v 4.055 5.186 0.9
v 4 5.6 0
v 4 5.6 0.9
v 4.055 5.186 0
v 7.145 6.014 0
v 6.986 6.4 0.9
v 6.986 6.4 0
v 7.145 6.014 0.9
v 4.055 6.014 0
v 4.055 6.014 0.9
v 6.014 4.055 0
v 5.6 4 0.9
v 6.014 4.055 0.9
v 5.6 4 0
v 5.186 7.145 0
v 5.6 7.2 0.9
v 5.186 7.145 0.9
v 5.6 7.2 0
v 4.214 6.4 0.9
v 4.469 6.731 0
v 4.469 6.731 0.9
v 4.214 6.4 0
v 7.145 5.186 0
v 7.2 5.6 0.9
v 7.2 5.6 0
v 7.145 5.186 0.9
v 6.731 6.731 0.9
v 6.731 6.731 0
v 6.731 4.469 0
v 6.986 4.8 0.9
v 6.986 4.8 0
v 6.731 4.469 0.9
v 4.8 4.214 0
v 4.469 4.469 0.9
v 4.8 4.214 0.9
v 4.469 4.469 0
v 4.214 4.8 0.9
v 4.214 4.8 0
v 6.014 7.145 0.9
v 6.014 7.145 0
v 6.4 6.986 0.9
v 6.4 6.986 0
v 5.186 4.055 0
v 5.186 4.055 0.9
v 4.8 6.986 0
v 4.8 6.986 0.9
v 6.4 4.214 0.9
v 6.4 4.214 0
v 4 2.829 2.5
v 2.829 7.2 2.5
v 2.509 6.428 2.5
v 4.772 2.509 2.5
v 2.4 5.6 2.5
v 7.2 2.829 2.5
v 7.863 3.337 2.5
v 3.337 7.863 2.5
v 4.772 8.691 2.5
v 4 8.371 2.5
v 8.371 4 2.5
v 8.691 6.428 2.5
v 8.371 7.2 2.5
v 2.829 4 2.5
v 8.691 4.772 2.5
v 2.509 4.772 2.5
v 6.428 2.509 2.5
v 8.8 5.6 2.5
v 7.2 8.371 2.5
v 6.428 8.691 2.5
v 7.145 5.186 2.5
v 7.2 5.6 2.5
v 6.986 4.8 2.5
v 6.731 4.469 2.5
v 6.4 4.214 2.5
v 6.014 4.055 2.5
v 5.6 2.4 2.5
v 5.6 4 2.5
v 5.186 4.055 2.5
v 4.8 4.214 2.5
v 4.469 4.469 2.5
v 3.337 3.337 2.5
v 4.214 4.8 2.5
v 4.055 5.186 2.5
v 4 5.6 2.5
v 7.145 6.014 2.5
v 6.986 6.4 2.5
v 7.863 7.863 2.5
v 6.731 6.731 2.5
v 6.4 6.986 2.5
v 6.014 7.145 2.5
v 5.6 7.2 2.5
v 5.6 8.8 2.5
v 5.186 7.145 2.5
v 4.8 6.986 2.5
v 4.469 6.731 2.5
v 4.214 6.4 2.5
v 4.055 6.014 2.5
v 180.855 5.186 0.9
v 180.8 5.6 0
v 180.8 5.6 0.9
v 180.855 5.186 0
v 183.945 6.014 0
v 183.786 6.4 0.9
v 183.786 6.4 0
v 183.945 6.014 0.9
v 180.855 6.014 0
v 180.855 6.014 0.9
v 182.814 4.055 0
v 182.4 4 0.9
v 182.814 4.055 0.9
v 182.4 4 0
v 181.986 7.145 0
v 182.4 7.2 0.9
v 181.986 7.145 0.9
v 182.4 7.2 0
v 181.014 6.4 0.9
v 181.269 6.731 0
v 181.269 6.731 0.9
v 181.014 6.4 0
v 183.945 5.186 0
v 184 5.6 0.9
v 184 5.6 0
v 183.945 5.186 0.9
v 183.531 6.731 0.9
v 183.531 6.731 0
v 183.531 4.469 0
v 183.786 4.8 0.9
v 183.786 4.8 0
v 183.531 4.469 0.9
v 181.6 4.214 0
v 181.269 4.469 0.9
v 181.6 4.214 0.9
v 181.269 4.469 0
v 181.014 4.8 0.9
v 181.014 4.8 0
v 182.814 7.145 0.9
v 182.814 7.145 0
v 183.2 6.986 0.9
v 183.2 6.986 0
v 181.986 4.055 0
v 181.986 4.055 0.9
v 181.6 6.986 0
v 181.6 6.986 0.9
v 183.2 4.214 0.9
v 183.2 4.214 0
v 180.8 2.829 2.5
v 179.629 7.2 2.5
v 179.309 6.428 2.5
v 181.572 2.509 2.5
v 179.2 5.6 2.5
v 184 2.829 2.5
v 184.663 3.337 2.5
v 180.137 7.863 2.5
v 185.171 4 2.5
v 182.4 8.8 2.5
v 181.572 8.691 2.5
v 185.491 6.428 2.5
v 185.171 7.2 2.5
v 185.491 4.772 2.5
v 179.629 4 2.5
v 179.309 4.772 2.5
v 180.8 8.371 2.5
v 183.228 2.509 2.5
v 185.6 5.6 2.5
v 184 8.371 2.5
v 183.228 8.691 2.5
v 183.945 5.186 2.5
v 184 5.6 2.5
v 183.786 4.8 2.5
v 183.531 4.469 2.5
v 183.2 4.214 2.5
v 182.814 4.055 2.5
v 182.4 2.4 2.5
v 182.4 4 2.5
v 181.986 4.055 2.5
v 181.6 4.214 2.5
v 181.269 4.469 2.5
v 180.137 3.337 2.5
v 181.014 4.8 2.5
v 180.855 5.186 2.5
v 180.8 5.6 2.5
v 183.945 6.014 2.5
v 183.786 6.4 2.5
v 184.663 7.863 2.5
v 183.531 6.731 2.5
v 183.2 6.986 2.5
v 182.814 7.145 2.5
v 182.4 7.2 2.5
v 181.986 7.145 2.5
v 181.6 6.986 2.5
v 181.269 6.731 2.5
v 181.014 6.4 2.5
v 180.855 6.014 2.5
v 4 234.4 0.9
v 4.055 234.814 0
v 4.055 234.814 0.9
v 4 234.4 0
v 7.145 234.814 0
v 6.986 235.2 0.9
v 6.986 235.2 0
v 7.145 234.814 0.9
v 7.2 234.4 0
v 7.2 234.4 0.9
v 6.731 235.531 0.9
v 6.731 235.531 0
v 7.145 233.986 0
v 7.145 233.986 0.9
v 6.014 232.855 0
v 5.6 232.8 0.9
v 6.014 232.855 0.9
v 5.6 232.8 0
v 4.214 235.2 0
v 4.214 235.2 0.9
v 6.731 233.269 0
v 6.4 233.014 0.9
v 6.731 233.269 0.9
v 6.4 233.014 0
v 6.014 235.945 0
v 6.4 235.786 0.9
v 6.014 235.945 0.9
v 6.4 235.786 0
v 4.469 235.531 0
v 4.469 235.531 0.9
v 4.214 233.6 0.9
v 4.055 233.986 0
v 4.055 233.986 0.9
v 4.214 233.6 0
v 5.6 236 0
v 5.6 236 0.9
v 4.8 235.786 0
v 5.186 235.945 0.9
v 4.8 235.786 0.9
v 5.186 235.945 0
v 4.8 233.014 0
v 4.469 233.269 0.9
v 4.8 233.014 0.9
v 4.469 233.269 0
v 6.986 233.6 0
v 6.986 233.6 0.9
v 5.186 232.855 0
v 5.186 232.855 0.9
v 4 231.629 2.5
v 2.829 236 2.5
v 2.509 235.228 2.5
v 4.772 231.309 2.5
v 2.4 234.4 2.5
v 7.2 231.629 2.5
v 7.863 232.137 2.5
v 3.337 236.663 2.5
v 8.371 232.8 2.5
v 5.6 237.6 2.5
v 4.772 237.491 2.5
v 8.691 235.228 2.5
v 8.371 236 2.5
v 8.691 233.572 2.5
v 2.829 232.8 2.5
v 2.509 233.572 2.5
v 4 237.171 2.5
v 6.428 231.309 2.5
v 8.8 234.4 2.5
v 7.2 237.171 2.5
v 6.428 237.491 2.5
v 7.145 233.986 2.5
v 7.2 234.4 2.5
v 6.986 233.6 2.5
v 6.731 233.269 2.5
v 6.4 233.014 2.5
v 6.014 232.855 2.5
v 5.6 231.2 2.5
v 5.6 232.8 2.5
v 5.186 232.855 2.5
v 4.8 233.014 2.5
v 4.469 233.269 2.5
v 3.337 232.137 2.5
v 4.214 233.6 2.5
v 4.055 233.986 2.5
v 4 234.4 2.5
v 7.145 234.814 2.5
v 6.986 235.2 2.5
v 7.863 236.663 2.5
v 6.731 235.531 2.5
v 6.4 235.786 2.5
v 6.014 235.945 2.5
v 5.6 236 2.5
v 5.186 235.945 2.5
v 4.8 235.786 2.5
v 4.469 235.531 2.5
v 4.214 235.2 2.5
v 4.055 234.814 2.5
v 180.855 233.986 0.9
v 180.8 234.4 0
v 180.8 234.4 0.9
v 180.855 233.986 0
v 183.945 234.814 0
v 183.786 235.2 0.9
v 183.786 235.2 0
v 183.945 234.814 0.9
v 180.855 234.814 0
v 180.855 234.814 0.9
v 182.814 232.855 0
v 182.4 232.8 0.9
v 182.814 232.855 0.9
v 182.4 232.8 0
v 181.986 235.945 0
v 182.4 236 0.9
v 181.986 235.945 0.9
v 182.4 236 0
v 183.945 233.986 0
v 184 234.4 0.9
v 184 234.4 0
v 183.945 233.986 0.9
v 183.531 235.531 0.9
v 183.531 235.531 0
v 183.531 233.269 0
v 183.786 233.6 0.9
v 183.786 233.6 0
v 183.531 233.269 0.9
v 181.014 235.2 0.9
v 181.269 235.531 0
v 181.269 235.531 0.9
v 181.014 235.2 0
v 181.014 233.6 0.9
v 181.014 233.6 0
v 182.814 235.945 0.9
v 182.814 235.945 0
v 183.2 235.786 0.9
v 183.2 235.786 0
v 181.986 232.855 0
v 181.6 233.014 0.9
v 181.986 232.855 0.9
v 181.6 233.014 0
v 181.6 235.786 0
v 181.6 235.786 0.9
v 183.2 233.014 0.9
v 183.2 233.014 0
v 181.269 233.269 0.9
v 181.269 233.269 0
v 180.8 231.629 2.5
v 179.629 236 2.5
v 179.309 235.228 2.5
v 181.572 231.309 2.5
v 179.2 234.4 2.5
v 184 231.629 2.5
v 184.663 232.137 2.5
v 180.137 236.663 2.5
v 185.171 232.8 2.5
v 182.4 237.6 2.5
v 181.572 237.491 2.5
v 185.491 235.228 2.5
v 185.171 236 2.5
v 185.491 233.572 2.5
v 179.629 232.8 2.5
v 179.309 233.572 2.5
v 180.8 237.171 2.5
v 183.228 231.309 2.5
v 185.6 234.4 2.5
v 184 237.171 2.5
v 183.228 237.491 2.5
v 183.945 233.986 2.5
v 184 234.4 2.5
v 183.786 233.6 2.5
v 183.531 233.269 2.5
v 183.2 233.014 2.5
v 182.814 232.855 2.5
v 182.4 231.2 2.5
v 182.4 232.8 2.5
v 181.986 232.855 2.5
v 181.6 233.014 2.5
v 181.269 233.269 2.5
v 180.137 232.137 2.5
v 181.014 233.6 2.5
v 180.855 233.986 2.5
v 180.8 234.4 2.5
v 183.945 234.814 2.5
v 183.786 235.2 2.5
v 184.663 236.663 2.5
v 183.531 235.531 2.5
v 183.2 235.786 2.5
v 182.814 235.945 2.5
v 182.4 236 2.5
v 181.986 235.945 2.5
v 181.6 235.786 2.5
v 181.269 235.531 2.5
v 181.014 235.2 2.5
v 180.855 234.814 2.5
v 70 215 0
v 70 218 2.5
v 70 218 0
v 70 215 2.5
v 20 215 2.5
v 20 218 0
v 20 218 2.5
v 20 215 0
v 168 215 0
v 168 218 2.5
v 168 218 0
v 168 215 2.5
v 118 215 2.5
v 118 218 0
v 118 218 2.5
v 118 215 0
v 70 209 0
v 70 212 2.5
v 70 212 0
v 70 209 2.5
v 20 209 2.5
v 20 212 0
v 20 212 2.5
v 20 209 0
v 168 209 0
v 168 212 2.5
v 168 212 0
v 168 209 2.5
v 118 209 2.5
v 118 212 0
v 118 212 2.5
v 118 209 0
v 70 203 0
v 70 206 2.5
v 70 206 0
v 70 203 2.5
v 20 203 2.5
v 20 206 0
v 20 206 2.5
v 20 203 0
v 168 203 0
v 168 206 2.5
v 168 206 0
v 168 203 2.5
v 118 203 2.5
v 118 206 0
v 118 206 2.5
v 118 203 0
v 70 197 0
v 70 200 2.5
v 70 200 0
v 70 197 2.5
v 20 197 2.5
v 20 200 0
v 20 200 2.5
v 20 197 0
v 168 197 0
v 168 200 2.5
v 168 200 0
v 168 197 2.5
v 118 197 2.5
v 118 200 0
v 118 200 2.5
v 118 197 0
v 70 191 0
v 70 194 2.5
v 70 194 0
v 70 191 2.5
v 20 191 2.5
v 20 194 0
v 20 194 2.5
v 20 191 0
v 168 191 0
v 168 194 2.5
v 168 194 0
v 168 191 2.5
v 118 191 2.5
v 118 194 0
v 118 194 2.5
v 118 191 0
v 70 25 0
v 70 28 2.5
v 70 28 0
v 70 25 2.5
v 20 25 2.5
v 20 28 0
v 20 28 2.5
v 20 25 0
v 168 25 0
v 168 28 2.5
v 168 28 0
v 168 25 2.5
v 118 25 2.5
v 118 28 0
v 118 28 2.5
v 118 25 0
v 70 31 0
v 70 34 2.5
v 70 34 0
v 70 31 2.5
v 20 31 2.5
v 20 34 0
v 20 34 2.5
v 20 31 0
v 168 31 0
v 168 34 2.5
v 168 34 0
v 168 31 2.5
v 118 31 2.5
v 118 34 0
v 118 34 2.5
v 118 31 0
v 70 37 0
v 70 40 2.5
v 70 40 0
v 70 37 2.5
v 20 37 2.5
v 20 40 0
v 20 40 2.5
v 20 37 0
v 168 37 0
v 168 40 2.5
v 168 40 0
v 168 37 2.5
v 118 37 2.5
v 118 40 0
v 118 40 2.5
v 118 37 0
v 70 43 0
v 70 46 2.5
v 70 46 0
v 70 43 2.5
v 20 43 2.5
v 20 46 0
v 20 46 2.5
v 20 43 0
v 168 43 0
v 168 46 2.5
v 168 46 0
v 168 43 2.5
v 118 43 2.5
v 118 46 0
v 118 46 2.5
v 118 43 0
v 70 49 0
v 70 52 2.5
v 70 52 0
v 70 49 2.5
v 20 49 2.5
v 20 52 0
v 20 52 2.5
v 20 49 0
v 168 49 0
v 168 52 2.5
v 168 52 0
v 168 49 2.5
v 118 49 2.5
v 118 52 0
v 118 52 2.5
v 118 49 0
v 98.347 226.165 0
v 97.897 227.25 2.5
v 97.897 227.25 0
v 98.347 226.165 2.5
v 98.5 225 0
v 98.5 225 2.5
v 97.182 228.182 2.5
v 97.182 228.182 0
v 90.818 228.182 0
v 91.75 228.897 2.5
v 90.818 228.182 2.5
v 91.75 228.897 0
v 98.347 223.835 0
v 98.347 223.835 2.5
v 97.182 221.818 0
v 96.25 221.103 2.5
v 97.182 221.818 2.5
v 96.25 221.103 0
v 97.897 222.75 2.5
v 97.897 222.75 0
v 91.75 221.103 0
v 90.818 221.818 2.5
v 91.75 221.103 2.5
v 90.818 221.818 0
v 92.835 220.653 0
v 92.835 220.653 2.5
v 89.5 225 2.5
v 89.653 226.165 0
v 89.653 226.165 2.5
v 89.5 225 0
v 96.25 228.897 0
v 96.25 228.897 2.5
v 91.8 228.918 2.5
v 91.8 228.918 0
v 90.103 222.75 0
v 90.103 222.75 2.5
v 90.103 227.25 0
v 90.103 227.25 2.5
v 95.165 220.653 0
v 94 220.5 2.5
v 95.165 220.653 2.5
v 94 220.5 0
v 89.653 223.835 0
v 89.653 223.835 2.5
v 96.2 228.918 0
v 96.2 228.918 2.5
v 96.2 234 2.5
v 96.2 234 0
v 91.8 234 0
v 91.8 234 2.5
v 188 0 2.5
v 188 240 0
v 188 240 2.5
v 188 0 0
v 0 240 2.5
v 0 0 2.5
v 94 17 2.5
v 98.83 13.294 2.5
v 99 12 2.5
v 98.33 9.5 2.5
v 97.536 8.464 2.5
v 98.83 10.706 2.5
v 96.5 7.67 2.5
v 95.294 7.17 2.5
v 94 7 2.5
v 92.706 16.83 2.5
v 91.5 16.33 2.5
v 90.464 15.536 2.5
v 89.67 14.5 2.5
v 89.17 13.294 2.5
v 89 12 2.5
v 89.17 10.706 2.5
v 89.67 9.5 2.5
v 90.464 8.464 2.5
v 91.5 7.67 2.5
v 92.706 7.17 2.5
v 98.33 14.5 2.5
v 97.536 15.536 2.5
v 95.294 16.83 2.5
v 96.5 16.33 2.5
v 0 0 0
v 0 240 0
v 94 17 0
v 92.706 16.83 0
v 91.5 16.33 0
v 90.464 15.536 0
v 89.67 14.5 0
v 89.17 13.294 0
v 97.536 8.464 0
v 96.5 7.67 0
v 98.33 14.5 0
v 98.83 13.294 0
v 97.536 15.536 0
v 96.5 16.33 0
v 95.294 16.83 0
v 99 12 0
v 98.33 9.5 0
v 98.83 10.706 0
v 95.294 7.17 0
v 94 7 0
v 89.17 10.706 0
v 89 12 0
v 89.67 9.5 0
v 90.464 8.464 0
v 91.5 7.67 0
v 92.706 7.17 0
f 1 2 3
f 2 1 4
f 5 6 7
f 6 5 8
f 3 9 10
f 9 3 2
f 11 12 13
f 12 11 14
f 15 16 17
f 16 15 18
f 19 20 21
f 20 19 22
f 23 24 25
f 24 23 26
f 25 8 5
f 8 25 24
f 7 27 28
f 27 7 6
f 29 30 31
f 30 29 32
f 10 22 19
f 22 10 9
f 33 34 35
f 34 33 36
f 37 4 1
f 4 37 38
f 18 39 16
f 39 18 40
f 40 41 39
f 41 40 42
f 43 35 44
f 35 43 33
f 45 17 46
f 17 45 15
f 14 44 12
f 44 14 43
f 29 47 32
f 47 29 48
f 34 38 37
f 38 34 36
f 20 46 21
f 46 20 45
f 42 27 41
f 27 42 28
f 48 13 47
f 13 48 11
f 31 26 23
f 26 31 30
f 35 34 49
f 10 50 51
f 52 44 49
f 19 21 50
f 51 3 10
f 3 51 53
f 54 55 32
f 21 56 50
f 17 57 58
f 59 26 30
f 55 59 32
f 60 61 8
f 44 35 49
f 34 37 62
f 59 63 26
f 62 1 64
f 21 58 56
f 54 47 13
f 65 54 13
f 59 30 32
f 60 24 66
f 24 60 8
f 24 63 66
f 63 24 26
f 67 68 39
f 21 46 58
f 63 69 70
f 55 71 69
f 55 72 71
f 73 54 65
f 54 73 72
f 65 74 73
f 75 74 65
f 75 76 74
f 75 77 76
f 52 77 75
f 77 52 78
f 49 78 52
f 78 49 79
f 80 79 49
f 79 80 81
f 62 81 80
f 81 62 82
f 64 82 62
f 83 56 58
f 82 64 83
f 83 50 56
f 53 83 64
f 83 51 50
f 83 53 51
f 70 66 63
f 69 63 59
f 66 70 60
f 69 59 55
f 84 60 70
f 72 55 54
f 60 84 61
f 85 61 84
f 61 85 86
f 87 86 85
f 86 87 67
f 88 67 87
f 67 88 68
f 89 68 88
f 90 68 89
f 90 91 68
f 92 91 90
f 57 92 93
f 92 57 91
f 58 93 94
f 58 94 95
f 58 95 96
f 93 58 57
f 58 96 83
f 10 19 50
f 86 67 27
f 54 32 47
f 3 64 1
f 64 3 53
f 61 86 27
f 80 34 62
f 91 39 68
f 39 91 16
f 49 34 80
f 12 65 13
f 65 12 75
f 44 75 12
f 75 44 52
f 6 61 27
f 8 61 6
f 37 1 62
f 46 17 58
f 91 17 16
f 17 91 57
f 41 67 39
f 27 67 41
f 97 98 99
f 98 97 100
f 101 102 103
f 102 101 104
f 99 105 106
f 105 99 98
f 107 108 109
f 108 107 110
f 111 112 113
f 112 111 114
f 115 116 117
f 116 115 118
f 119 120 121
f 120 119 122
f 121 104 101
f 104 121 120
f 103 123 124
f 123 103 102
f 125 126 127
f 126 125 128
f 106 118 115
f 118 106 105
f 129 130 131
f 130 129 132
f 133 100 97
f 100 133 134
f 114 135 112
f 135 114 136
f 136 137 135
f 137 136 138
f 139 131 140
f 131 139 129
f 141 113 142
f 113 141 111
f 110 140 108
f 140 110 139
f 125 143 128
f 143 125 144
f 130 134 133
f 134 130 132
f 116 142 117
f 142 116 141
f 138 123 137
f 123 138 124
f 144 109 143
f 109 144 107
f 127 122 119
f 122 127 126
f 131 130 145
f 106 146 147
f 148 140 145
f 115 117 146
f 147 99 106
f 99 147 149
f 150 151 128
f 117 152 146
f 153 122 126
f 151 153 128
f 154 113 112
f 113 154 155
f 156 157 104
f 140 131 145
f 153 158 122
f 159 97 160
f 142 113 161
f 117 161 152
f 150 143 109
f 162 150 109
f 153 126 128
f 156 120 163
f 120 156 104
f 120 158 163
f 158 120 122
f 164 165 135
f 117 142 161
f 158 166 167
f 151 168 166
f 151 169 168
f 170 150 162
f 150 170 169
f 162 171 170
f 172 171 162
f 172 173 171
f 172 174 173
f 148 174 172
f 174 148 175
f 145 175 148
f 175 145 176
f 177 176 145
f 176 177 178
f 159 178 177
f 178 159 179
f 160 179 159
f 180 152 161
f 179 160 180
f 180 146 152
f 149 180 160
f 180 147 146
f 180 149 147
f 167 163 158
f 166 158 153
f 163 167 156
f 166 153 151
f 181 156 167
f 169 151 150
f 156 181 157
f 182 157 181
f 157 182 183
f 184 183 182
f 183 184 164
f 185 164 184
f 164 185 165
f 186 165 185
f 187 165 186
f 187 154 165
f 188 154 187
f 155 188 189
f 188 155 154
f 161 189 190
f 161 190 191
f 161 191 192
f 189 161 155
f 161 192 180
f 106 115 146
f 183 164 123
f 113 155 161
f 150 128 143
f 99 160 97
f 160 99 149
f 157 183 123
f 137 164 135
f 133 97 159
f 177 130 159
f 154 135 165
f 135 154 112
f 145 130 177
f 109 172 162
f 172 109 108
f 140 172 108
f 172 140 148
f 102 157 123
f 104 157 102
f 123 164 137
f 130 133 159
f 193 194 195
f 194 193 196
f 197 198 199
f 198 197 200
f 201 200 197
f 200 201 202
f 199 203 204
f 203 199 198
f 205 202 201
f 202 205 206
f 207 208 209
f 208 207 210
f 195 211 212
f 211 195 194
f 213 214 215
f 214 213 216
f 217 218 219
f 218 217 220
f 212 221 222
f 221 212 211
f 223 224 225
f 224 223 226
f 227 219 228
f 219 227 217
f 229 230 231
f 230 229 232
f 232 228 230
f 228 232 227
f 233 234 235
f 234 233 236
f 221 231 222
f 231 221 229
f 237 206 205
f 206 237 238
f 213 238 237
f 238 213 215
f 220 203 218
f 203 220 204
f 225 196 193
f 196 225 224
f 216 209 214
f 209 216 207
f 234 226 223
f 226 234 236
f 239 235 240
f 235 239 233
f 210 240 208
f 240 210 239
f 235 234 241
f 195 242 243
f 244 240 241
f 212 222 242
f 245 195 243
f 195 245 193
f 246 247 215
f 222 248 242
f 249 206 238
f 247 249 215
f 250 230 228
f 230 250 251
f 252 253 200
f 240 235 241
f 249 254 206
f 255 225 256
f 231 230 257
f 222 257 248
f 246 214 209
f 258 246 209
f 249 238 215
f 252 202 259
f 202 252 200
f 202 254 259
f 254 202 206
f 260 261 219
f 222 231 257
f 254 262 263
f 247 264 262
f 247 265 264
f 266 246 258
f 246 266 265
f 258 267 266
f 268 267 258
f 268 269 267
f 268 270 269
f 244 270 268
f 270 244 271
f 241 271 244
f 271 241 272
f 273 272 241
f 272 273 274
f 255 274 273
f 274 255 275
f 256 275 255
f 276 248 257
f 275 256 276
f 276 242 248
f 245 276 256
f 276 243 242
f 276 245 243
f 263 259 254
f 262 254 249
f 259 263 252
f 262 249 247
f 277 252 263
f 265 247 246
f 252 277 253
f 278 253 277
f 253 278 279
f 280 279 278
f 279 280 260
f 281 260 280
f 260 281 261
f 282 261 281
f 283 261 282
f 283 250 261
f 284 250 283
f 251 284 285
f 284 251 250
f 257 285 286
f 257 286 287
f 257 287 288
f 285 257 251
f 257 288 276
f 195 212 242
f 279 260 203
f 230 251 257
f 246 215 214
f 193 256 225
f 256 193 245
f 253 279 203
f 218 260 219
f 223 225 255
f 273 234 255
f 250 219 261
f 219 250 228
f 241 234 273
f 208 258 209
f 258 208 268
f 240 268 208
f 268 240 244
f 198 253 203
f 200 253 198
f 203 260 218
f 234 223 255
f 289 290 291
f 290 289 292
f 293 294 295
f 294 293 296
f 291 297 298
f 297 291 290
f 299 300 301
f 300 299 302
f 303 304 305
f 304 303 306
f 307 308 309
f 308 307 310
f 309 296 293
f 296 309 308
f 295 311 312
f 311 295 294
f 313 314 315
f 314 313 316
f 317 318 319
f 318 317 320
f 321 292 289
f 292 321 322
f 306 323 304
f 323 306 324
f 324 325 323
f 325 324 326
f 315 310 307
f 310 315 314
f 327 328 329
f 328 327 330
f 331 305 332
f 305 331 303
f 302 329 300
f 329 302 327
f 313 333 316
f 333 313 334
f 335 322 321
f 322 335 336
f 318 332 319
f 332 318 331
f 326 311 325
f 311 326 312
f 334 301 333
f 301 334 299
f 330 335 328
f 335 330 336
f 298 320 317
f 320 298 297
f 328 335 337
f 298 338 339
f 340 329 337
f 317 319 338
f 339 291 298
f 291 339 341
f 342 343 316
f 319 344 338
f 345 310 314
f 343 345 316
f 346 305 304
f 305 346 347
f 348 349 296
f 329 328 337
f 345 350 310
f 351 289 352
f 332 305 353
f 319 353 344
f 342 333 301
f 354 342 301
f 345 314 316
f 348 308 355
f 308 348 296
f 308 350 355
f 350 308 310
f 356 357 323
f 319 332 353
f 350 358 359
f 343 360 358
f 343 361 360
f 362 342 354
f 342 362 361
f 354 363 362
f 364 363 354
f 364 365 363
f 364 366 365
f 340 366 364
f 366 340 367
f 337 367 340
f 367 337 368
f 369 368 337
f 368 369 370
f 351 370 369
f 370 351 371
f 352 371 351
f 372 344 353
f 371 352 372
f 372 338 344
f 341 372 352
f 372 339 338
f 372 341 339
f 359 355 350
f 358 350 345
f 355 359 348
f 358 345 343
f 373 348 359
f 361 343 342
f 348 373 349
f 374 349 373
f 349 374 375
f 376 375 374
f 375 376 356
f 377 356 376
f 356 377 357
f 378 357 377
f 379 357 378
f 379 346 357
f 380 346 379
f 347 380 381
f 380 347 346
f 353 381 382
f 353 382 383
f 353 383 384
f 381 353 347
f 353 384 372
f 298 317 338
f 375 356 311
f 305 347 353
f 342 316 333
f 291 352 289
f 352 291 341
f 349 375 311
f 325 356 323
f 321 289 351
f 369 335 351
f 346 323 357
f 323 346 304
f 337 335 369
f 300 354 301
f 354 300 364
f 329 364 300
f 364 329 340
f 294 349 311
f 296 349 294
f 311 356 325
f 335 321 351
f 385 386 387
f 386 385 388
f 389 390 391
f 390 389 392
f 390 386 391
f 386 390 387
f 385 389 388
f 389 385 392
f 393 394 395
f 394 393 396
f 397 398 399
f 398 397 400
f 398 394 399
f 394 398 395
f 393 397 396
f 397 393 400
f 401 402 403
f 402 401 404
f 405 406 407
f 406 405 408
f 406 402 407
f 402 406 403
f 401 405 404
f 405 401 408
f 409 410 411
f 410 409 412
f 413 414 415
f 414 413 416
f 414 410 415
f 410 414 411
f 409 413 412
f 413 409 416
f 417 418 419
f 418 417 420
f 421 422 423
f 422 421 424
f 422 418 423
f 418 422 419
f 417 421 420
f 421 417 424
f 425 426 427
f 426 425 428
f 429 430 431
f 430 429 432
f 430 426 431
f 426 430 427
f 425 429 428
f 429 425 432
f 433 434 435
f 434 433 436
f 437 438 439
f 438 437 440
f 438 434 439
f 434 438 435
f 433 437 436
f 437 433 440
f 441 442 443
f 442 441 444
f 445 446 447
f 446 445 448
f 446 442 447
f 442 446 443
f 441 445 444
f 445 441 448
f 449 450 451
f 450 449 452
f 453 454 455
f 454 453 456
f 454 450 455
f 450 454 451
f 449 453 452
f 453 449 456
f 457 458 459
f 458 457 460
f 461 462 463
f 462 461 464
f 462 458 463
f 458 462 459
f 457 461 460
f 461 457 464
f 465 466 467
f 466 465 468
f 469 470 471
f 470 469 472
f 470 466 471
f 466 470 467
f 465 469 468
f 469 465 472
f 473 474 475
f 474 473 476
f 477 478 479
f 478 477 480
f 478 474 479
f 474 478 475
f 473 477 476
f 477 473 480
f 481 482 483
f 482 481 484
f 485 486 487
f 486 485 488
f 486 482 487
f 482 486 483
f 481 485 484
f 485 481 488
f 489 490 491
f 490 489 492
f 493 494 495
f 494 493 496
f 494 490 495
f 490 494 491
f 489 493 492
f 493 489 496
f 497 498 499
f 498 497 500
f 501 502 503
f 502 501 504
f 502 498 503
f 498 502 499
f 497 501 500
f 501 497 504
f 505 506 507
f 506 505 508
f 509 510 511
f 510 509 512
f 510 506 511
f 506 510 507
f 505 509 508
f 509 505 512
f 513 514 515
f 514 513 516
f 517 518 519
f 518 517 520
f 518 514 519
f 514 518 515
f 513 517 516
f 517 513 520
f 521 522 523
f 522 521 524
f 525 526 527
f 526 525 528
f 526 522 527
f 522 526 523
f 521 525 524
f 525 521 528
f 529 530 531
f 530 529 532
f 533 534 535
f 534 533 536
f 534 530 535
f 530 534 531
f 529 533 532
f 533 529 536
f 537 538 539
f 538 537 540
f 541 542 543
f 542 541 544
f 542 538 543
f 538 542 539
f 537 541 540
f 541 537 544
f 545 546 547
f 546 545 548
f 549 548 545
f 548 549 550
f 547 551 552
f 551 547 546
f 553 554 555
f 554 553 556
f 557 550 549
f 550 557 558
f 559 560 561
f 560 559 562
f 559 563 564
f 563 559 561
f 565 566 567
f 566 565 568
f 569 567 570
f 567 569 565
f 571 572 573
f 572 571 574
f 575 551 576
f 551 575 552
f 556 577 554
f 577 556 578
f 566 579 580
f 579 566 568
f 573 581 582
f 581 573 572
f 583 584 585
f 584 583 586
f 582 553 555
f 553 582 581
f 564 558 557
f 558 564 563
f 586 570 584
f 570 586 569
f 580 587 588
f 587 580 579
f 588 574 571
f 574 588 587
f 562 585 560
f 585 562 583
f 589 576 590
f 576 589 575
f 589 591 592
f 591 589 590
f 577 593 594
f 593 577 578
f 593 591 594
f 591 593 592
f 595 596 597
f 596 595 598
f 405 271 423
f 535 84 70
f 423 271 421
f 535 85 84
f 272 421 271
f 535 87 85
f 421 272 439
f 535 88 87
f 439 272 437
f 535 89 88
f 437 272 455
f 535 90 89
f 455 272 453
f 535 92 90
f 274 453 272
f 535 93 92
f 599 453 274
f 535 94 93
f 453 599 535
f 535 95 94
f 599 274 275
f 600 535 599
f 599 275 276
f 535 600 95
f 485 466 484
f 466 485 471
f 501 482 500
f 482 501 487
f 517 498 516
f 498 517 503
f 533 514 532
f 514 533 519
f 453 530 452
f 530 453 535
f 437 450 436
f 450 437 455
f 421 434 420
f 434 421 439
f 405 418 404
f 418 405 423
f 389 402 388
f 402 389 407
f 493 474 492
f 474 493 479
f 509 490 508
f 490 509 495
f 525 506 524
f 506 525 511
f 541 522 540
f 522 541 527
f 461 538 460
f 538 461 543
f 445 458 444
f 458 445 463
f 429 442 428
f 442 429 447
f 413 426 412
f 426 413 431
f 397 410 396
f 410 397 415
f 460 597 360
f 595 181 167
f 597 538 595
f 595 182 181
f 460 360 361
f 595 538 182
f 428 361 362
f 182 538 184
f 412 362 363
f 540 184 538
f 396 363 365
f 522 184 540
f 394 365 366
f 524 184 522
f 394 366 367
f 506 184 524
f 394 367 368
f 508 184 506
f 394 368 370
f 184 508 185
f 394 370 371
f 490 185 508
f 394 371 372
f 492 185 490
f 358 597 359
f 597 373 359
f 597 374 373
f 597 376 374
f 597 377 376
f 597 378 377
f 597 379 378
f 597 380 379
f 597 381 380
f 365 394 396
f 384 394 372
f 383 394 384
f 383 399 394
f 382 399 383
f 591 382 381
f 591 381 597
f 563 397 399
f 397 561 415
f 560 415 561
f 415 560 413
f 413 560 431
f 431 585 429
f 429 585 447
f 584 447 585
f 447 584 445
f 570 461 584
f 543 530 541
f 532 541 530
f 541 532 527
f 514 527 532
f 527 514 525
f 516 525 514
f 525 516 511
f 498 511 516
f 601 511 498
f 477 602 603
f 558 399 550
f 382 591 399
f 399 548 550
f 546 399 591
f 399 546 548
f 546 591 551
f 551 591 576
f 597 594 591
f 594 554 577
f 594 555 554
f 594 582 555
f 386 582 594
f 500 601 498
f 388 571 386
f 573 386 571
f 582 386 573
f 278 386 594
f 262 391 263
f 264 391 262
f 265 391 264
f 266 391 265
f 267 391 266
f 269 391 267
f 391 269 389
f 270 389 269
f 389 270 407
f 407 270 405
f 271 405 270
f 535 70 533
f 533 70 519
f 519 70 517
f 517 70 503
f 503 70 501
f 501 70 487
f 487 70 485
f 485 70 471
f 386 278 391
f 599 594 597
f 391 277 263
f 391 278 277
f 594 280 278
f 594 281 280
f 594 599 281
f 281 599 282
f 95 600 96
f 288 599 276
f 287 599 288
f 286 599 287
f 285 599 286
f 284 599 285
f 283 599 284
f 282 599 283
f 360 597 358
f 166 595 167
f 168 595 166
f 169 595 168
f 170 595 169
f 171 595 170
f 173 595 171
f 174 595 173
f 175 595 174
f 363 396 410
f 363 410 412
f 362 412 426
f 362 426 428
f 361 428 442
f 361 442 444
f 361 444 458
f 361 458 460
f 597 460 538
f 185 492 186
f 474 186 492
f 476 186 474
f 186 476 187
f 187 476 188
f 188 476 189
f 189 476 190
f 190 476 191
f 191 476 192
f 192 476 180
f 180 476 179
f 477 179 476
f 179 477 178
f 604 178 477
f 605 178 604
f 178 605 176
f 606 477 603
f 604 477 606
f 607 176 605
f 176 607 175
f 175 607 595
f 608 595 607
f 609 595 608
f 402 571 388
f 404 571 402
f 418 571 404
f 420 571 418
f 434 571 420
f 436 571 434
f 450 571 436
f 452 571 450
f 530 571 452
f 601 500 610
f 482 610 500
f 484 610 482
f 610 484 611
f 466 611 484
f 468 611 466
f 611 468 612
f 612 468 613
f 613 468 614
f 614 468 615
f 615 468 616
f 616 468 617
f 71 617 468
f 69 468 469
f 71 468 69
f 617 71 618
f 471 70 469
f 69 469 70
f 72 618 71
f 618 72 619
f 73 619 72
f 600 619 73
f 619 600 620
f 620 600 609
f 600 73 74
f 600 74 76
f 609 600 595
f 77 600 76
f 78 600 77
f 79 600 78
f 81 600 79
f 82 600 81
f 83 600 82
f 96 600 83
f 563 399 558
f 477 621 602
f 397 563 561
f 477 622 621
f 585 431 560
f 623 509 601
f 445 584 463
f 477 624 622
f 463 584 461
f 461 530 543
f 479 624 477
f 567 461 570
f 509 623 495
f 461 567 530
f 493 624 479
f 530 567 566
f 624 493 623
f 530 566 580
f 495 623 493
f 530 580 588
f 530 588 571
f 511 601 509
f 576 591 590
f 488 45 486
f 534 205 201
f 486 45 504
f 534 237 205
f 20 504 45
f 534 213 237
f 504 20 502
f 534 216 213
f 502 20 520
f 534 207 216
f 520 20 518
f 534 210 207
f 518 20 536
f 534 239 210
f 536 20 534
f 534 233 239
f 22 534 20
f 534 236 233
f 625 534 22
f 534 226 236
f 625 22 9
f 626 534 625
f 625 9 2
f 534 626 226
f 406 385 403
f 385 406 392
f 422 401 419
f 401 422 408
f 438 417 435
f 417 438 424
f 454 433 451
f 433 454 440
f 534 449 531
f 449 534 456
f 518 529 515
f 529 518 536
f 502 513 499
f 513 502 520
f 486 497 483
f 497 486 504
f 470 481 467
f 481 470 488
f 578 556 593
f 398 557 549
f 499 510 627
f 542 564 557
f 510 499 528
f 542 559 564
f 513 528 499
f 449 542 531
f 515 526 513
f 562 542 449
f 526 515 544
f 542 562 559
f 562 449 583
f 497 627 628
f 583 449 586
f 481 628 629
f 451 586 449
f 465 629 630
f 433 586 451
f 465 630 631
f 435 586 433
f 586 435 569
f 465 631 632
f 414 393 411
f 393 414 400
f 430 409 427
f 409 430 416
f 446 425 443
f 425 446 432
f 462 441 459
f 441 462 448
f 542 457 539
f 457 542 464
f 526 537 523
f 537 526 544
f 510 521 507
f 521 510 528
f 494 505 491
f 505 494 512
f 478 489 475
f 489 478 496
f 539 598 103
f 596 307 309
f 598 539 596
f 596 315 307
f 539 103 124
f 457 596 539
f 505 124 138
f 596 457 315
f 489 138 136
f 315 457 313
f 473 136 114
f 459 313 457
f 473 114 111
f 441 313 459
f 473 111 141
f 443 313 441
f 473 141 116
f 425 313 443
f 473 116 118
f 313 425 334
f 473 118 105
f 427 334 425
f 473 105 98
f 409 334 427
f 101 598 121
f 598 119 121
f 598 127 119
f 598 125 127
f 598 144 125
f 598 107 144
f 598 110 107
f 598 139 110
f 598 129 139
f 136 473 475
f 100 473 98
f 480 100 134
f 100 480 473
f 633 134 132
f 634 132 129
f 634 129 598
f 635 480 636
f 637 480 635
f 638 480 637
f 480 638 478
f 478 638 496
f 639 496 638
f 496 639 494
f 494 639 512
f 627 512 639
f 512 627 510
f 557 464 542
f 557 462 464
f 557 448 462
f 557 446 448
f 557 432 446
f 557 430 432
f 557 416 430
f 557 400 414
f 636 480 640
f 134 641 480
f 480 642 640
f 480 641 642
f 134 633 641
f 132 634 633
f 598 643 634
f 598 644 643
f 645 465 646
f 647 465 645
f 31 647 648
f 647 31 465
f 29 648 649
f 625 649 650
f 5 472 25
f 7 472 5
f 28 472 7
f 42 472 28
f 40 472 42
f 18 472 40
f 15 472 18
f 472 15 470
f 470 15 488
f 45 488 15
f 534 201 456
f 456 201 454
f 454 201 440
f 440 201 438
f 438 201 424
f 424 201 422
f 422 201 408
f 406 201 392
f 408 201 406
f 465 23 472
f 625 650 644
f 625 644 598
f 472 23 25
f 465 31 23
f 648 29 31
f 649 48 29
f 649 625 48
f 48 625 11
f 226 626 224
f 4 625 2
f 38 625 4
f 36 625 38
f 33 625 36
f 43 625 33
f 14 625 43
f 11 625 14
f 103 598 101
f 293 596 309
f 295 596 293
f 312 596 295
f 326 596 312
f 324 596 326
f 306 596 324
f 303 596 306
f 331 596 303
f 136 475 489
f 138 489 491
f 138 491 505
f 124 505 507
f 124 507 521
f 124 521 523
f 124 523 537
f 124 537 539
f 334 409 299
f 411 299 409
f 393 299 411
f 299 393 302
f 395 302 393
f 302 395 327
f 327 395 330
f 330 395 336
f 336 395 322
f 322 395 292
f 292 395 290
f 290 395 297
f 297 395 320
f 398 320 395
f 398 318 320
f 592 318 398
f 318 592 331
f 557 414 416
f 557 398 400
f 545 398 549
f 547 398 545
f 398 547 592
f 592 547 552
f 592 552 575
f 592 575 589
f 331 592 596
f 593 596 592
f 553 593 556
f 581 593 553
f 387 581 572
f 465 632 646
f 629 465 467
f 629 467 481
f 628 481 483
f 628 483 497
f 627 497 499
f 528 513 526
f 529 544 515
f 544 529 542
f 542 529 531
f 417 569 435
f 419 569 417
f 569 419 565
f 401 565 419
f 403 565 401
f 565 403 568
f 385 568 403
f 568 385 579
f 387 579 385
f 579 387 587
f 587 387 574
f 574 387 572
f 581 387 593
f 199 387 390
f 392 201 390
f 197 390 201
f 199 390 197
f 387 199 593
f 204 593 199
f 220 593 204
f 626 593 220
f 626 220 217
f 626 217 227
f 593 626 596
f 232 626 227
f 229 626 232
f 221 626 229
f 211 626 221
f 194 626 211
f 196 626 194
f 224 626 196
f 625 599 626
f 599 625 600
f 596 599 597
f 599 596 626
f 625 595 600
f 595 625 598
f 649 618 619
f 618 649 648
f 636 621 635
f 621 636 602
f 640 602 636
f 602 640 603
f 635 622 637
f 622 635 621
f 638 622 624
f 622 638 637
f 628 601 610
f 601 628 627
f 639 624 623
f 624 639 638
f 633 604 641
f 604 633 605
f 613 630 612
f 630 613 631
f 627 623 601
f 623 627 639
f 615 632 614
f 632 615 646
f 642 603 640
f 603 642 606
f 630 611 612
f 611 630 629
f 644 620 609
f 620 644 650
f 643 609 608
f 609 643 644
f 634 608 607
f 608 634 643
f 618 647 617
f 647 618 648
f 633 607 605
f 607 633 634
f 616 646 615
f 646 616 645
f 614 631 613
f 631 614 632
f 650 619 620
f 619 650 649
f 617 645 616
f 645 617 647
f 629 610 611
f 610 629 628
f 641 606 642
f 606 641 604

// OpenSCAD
// ==============================================================================
// WORDCLOCK ESP32 - PIEZA 3: TAPA TRASERA CON VENTILACIONES (REAR COVER LID)
// Parametric OpenSCAD Model for Bambu Lab (256x256 mm build plate)
// Matching wall_thick = 1.6 mm
// ==============================================================================

// --- Parameters ---
box_w       = 188.0;
box_h       = 240.0;
wall_thick  = 1.6;     // Coincide con las paredes del marco
lid_thick   = 2.5;     // Grosor de la tapa trasera (mm)

// --- Module: Tapa Trasera Completa ---
module wordclock_back_lid() {
    difference() {
        // 1. Placa Base de la Tapa (188 x 240 mm)
        cube([box_w, box_h, lid_thick]);

        // 2. Orificios avellanados (Countersunk) en las 4 esquinas para tornillos M3
        screw_off = wall_thick + 4.0;
        
        // Esquina Inferior Izquierda
        translate([screw_off, screw_off, -0.1]) {
            cylinder(r = 1.6, h = lid_thick + 0.2, $fn = 24);
            translate([0, 0, 1.0]) cylinder(r1 = 1.6, r2 = 3.2, h = 1.6, $fn = 24);
        }
        // Esquina Inferior Derecha
        translate([box_w - screw_off, screw_off, -0.1]) {
            cylinder(r = 1.6, h = lid_thick + 0.2, $fn = 24);
            translate([0, 0, 1.0]) cylinder(r1 = 1.6, r2 = 3.2, h = 1.6, $fn = 24);
        }
        // Esquina Superior Izquierda
        translate([screw_off, box_h - screw_off, -0.1]) {
            cylinder(r = 1.6, h = lid_thick + 0.2, $fn = 24);
            translate([0, 0, 1.0]) cylinder(r1 = 1.6, r2 = 3.2, h = 1.6, $fn = 24);
        }
        // Esquina Superior Derecha
        translate([box_w - screw_off, box_h - screw_off, -0.1]) {
            cylinder(r = 1.6, h = lid_thick + 0.2, $fn = 24);
            translate([0, 0, 1.0]) cylinder(r1 = 1.6, r2 = 3.2, h = 1.6, $fn = 24);
        }

        // 3. Ranuras de Ventilación Superior
        for (i = [0 : 4]) {
            y_slot = box_h - 25 - (i * 6);
            translate([20, y_slot, -0.1])         cube([50, 3.0, lid_thick + 0.2]);
            translate([box_w - 70, y_slot, -0.1]) cube([50, 3.0, lid_thick + 0.2]);
        }

        // 4. Ranuras de Ventilación Inferior
        for (i = [0 : 4]) {
            y_slot = 25 + (i * 6);
            translate([20, y_slot, -0.1])         cube([50, 3.0, lid_thick + 0.2]);
            translate([box_w - 70, y_slot, -0.1]) cube([50, 3.0, lid_thick + 0.2]);
        }

        // 5. Orificio para Conector de Alimentación (Jack DC / Cable USB-C)
        translate([box_w / 2, 12, -0.1]) {
            cylinder(r = 5.0, h = lid_thick + 0.2, $fn = 24);
        }

        // 6. Muesca en forma de cerradura (Keyhole) para colgar en pared
        translate([box_w / 2, box_h - 15, -0.1]) {
            union() {
                cylinder(r = 4.5, h = lid_thick + 0.2, $fn = 24);
                translate([-2.2, 0, 0]) cube([4.4, 9.0, lid_thick + 0.2]);
            }
        }
    }
}

// Generar modelo
wordclock_back_lid();
